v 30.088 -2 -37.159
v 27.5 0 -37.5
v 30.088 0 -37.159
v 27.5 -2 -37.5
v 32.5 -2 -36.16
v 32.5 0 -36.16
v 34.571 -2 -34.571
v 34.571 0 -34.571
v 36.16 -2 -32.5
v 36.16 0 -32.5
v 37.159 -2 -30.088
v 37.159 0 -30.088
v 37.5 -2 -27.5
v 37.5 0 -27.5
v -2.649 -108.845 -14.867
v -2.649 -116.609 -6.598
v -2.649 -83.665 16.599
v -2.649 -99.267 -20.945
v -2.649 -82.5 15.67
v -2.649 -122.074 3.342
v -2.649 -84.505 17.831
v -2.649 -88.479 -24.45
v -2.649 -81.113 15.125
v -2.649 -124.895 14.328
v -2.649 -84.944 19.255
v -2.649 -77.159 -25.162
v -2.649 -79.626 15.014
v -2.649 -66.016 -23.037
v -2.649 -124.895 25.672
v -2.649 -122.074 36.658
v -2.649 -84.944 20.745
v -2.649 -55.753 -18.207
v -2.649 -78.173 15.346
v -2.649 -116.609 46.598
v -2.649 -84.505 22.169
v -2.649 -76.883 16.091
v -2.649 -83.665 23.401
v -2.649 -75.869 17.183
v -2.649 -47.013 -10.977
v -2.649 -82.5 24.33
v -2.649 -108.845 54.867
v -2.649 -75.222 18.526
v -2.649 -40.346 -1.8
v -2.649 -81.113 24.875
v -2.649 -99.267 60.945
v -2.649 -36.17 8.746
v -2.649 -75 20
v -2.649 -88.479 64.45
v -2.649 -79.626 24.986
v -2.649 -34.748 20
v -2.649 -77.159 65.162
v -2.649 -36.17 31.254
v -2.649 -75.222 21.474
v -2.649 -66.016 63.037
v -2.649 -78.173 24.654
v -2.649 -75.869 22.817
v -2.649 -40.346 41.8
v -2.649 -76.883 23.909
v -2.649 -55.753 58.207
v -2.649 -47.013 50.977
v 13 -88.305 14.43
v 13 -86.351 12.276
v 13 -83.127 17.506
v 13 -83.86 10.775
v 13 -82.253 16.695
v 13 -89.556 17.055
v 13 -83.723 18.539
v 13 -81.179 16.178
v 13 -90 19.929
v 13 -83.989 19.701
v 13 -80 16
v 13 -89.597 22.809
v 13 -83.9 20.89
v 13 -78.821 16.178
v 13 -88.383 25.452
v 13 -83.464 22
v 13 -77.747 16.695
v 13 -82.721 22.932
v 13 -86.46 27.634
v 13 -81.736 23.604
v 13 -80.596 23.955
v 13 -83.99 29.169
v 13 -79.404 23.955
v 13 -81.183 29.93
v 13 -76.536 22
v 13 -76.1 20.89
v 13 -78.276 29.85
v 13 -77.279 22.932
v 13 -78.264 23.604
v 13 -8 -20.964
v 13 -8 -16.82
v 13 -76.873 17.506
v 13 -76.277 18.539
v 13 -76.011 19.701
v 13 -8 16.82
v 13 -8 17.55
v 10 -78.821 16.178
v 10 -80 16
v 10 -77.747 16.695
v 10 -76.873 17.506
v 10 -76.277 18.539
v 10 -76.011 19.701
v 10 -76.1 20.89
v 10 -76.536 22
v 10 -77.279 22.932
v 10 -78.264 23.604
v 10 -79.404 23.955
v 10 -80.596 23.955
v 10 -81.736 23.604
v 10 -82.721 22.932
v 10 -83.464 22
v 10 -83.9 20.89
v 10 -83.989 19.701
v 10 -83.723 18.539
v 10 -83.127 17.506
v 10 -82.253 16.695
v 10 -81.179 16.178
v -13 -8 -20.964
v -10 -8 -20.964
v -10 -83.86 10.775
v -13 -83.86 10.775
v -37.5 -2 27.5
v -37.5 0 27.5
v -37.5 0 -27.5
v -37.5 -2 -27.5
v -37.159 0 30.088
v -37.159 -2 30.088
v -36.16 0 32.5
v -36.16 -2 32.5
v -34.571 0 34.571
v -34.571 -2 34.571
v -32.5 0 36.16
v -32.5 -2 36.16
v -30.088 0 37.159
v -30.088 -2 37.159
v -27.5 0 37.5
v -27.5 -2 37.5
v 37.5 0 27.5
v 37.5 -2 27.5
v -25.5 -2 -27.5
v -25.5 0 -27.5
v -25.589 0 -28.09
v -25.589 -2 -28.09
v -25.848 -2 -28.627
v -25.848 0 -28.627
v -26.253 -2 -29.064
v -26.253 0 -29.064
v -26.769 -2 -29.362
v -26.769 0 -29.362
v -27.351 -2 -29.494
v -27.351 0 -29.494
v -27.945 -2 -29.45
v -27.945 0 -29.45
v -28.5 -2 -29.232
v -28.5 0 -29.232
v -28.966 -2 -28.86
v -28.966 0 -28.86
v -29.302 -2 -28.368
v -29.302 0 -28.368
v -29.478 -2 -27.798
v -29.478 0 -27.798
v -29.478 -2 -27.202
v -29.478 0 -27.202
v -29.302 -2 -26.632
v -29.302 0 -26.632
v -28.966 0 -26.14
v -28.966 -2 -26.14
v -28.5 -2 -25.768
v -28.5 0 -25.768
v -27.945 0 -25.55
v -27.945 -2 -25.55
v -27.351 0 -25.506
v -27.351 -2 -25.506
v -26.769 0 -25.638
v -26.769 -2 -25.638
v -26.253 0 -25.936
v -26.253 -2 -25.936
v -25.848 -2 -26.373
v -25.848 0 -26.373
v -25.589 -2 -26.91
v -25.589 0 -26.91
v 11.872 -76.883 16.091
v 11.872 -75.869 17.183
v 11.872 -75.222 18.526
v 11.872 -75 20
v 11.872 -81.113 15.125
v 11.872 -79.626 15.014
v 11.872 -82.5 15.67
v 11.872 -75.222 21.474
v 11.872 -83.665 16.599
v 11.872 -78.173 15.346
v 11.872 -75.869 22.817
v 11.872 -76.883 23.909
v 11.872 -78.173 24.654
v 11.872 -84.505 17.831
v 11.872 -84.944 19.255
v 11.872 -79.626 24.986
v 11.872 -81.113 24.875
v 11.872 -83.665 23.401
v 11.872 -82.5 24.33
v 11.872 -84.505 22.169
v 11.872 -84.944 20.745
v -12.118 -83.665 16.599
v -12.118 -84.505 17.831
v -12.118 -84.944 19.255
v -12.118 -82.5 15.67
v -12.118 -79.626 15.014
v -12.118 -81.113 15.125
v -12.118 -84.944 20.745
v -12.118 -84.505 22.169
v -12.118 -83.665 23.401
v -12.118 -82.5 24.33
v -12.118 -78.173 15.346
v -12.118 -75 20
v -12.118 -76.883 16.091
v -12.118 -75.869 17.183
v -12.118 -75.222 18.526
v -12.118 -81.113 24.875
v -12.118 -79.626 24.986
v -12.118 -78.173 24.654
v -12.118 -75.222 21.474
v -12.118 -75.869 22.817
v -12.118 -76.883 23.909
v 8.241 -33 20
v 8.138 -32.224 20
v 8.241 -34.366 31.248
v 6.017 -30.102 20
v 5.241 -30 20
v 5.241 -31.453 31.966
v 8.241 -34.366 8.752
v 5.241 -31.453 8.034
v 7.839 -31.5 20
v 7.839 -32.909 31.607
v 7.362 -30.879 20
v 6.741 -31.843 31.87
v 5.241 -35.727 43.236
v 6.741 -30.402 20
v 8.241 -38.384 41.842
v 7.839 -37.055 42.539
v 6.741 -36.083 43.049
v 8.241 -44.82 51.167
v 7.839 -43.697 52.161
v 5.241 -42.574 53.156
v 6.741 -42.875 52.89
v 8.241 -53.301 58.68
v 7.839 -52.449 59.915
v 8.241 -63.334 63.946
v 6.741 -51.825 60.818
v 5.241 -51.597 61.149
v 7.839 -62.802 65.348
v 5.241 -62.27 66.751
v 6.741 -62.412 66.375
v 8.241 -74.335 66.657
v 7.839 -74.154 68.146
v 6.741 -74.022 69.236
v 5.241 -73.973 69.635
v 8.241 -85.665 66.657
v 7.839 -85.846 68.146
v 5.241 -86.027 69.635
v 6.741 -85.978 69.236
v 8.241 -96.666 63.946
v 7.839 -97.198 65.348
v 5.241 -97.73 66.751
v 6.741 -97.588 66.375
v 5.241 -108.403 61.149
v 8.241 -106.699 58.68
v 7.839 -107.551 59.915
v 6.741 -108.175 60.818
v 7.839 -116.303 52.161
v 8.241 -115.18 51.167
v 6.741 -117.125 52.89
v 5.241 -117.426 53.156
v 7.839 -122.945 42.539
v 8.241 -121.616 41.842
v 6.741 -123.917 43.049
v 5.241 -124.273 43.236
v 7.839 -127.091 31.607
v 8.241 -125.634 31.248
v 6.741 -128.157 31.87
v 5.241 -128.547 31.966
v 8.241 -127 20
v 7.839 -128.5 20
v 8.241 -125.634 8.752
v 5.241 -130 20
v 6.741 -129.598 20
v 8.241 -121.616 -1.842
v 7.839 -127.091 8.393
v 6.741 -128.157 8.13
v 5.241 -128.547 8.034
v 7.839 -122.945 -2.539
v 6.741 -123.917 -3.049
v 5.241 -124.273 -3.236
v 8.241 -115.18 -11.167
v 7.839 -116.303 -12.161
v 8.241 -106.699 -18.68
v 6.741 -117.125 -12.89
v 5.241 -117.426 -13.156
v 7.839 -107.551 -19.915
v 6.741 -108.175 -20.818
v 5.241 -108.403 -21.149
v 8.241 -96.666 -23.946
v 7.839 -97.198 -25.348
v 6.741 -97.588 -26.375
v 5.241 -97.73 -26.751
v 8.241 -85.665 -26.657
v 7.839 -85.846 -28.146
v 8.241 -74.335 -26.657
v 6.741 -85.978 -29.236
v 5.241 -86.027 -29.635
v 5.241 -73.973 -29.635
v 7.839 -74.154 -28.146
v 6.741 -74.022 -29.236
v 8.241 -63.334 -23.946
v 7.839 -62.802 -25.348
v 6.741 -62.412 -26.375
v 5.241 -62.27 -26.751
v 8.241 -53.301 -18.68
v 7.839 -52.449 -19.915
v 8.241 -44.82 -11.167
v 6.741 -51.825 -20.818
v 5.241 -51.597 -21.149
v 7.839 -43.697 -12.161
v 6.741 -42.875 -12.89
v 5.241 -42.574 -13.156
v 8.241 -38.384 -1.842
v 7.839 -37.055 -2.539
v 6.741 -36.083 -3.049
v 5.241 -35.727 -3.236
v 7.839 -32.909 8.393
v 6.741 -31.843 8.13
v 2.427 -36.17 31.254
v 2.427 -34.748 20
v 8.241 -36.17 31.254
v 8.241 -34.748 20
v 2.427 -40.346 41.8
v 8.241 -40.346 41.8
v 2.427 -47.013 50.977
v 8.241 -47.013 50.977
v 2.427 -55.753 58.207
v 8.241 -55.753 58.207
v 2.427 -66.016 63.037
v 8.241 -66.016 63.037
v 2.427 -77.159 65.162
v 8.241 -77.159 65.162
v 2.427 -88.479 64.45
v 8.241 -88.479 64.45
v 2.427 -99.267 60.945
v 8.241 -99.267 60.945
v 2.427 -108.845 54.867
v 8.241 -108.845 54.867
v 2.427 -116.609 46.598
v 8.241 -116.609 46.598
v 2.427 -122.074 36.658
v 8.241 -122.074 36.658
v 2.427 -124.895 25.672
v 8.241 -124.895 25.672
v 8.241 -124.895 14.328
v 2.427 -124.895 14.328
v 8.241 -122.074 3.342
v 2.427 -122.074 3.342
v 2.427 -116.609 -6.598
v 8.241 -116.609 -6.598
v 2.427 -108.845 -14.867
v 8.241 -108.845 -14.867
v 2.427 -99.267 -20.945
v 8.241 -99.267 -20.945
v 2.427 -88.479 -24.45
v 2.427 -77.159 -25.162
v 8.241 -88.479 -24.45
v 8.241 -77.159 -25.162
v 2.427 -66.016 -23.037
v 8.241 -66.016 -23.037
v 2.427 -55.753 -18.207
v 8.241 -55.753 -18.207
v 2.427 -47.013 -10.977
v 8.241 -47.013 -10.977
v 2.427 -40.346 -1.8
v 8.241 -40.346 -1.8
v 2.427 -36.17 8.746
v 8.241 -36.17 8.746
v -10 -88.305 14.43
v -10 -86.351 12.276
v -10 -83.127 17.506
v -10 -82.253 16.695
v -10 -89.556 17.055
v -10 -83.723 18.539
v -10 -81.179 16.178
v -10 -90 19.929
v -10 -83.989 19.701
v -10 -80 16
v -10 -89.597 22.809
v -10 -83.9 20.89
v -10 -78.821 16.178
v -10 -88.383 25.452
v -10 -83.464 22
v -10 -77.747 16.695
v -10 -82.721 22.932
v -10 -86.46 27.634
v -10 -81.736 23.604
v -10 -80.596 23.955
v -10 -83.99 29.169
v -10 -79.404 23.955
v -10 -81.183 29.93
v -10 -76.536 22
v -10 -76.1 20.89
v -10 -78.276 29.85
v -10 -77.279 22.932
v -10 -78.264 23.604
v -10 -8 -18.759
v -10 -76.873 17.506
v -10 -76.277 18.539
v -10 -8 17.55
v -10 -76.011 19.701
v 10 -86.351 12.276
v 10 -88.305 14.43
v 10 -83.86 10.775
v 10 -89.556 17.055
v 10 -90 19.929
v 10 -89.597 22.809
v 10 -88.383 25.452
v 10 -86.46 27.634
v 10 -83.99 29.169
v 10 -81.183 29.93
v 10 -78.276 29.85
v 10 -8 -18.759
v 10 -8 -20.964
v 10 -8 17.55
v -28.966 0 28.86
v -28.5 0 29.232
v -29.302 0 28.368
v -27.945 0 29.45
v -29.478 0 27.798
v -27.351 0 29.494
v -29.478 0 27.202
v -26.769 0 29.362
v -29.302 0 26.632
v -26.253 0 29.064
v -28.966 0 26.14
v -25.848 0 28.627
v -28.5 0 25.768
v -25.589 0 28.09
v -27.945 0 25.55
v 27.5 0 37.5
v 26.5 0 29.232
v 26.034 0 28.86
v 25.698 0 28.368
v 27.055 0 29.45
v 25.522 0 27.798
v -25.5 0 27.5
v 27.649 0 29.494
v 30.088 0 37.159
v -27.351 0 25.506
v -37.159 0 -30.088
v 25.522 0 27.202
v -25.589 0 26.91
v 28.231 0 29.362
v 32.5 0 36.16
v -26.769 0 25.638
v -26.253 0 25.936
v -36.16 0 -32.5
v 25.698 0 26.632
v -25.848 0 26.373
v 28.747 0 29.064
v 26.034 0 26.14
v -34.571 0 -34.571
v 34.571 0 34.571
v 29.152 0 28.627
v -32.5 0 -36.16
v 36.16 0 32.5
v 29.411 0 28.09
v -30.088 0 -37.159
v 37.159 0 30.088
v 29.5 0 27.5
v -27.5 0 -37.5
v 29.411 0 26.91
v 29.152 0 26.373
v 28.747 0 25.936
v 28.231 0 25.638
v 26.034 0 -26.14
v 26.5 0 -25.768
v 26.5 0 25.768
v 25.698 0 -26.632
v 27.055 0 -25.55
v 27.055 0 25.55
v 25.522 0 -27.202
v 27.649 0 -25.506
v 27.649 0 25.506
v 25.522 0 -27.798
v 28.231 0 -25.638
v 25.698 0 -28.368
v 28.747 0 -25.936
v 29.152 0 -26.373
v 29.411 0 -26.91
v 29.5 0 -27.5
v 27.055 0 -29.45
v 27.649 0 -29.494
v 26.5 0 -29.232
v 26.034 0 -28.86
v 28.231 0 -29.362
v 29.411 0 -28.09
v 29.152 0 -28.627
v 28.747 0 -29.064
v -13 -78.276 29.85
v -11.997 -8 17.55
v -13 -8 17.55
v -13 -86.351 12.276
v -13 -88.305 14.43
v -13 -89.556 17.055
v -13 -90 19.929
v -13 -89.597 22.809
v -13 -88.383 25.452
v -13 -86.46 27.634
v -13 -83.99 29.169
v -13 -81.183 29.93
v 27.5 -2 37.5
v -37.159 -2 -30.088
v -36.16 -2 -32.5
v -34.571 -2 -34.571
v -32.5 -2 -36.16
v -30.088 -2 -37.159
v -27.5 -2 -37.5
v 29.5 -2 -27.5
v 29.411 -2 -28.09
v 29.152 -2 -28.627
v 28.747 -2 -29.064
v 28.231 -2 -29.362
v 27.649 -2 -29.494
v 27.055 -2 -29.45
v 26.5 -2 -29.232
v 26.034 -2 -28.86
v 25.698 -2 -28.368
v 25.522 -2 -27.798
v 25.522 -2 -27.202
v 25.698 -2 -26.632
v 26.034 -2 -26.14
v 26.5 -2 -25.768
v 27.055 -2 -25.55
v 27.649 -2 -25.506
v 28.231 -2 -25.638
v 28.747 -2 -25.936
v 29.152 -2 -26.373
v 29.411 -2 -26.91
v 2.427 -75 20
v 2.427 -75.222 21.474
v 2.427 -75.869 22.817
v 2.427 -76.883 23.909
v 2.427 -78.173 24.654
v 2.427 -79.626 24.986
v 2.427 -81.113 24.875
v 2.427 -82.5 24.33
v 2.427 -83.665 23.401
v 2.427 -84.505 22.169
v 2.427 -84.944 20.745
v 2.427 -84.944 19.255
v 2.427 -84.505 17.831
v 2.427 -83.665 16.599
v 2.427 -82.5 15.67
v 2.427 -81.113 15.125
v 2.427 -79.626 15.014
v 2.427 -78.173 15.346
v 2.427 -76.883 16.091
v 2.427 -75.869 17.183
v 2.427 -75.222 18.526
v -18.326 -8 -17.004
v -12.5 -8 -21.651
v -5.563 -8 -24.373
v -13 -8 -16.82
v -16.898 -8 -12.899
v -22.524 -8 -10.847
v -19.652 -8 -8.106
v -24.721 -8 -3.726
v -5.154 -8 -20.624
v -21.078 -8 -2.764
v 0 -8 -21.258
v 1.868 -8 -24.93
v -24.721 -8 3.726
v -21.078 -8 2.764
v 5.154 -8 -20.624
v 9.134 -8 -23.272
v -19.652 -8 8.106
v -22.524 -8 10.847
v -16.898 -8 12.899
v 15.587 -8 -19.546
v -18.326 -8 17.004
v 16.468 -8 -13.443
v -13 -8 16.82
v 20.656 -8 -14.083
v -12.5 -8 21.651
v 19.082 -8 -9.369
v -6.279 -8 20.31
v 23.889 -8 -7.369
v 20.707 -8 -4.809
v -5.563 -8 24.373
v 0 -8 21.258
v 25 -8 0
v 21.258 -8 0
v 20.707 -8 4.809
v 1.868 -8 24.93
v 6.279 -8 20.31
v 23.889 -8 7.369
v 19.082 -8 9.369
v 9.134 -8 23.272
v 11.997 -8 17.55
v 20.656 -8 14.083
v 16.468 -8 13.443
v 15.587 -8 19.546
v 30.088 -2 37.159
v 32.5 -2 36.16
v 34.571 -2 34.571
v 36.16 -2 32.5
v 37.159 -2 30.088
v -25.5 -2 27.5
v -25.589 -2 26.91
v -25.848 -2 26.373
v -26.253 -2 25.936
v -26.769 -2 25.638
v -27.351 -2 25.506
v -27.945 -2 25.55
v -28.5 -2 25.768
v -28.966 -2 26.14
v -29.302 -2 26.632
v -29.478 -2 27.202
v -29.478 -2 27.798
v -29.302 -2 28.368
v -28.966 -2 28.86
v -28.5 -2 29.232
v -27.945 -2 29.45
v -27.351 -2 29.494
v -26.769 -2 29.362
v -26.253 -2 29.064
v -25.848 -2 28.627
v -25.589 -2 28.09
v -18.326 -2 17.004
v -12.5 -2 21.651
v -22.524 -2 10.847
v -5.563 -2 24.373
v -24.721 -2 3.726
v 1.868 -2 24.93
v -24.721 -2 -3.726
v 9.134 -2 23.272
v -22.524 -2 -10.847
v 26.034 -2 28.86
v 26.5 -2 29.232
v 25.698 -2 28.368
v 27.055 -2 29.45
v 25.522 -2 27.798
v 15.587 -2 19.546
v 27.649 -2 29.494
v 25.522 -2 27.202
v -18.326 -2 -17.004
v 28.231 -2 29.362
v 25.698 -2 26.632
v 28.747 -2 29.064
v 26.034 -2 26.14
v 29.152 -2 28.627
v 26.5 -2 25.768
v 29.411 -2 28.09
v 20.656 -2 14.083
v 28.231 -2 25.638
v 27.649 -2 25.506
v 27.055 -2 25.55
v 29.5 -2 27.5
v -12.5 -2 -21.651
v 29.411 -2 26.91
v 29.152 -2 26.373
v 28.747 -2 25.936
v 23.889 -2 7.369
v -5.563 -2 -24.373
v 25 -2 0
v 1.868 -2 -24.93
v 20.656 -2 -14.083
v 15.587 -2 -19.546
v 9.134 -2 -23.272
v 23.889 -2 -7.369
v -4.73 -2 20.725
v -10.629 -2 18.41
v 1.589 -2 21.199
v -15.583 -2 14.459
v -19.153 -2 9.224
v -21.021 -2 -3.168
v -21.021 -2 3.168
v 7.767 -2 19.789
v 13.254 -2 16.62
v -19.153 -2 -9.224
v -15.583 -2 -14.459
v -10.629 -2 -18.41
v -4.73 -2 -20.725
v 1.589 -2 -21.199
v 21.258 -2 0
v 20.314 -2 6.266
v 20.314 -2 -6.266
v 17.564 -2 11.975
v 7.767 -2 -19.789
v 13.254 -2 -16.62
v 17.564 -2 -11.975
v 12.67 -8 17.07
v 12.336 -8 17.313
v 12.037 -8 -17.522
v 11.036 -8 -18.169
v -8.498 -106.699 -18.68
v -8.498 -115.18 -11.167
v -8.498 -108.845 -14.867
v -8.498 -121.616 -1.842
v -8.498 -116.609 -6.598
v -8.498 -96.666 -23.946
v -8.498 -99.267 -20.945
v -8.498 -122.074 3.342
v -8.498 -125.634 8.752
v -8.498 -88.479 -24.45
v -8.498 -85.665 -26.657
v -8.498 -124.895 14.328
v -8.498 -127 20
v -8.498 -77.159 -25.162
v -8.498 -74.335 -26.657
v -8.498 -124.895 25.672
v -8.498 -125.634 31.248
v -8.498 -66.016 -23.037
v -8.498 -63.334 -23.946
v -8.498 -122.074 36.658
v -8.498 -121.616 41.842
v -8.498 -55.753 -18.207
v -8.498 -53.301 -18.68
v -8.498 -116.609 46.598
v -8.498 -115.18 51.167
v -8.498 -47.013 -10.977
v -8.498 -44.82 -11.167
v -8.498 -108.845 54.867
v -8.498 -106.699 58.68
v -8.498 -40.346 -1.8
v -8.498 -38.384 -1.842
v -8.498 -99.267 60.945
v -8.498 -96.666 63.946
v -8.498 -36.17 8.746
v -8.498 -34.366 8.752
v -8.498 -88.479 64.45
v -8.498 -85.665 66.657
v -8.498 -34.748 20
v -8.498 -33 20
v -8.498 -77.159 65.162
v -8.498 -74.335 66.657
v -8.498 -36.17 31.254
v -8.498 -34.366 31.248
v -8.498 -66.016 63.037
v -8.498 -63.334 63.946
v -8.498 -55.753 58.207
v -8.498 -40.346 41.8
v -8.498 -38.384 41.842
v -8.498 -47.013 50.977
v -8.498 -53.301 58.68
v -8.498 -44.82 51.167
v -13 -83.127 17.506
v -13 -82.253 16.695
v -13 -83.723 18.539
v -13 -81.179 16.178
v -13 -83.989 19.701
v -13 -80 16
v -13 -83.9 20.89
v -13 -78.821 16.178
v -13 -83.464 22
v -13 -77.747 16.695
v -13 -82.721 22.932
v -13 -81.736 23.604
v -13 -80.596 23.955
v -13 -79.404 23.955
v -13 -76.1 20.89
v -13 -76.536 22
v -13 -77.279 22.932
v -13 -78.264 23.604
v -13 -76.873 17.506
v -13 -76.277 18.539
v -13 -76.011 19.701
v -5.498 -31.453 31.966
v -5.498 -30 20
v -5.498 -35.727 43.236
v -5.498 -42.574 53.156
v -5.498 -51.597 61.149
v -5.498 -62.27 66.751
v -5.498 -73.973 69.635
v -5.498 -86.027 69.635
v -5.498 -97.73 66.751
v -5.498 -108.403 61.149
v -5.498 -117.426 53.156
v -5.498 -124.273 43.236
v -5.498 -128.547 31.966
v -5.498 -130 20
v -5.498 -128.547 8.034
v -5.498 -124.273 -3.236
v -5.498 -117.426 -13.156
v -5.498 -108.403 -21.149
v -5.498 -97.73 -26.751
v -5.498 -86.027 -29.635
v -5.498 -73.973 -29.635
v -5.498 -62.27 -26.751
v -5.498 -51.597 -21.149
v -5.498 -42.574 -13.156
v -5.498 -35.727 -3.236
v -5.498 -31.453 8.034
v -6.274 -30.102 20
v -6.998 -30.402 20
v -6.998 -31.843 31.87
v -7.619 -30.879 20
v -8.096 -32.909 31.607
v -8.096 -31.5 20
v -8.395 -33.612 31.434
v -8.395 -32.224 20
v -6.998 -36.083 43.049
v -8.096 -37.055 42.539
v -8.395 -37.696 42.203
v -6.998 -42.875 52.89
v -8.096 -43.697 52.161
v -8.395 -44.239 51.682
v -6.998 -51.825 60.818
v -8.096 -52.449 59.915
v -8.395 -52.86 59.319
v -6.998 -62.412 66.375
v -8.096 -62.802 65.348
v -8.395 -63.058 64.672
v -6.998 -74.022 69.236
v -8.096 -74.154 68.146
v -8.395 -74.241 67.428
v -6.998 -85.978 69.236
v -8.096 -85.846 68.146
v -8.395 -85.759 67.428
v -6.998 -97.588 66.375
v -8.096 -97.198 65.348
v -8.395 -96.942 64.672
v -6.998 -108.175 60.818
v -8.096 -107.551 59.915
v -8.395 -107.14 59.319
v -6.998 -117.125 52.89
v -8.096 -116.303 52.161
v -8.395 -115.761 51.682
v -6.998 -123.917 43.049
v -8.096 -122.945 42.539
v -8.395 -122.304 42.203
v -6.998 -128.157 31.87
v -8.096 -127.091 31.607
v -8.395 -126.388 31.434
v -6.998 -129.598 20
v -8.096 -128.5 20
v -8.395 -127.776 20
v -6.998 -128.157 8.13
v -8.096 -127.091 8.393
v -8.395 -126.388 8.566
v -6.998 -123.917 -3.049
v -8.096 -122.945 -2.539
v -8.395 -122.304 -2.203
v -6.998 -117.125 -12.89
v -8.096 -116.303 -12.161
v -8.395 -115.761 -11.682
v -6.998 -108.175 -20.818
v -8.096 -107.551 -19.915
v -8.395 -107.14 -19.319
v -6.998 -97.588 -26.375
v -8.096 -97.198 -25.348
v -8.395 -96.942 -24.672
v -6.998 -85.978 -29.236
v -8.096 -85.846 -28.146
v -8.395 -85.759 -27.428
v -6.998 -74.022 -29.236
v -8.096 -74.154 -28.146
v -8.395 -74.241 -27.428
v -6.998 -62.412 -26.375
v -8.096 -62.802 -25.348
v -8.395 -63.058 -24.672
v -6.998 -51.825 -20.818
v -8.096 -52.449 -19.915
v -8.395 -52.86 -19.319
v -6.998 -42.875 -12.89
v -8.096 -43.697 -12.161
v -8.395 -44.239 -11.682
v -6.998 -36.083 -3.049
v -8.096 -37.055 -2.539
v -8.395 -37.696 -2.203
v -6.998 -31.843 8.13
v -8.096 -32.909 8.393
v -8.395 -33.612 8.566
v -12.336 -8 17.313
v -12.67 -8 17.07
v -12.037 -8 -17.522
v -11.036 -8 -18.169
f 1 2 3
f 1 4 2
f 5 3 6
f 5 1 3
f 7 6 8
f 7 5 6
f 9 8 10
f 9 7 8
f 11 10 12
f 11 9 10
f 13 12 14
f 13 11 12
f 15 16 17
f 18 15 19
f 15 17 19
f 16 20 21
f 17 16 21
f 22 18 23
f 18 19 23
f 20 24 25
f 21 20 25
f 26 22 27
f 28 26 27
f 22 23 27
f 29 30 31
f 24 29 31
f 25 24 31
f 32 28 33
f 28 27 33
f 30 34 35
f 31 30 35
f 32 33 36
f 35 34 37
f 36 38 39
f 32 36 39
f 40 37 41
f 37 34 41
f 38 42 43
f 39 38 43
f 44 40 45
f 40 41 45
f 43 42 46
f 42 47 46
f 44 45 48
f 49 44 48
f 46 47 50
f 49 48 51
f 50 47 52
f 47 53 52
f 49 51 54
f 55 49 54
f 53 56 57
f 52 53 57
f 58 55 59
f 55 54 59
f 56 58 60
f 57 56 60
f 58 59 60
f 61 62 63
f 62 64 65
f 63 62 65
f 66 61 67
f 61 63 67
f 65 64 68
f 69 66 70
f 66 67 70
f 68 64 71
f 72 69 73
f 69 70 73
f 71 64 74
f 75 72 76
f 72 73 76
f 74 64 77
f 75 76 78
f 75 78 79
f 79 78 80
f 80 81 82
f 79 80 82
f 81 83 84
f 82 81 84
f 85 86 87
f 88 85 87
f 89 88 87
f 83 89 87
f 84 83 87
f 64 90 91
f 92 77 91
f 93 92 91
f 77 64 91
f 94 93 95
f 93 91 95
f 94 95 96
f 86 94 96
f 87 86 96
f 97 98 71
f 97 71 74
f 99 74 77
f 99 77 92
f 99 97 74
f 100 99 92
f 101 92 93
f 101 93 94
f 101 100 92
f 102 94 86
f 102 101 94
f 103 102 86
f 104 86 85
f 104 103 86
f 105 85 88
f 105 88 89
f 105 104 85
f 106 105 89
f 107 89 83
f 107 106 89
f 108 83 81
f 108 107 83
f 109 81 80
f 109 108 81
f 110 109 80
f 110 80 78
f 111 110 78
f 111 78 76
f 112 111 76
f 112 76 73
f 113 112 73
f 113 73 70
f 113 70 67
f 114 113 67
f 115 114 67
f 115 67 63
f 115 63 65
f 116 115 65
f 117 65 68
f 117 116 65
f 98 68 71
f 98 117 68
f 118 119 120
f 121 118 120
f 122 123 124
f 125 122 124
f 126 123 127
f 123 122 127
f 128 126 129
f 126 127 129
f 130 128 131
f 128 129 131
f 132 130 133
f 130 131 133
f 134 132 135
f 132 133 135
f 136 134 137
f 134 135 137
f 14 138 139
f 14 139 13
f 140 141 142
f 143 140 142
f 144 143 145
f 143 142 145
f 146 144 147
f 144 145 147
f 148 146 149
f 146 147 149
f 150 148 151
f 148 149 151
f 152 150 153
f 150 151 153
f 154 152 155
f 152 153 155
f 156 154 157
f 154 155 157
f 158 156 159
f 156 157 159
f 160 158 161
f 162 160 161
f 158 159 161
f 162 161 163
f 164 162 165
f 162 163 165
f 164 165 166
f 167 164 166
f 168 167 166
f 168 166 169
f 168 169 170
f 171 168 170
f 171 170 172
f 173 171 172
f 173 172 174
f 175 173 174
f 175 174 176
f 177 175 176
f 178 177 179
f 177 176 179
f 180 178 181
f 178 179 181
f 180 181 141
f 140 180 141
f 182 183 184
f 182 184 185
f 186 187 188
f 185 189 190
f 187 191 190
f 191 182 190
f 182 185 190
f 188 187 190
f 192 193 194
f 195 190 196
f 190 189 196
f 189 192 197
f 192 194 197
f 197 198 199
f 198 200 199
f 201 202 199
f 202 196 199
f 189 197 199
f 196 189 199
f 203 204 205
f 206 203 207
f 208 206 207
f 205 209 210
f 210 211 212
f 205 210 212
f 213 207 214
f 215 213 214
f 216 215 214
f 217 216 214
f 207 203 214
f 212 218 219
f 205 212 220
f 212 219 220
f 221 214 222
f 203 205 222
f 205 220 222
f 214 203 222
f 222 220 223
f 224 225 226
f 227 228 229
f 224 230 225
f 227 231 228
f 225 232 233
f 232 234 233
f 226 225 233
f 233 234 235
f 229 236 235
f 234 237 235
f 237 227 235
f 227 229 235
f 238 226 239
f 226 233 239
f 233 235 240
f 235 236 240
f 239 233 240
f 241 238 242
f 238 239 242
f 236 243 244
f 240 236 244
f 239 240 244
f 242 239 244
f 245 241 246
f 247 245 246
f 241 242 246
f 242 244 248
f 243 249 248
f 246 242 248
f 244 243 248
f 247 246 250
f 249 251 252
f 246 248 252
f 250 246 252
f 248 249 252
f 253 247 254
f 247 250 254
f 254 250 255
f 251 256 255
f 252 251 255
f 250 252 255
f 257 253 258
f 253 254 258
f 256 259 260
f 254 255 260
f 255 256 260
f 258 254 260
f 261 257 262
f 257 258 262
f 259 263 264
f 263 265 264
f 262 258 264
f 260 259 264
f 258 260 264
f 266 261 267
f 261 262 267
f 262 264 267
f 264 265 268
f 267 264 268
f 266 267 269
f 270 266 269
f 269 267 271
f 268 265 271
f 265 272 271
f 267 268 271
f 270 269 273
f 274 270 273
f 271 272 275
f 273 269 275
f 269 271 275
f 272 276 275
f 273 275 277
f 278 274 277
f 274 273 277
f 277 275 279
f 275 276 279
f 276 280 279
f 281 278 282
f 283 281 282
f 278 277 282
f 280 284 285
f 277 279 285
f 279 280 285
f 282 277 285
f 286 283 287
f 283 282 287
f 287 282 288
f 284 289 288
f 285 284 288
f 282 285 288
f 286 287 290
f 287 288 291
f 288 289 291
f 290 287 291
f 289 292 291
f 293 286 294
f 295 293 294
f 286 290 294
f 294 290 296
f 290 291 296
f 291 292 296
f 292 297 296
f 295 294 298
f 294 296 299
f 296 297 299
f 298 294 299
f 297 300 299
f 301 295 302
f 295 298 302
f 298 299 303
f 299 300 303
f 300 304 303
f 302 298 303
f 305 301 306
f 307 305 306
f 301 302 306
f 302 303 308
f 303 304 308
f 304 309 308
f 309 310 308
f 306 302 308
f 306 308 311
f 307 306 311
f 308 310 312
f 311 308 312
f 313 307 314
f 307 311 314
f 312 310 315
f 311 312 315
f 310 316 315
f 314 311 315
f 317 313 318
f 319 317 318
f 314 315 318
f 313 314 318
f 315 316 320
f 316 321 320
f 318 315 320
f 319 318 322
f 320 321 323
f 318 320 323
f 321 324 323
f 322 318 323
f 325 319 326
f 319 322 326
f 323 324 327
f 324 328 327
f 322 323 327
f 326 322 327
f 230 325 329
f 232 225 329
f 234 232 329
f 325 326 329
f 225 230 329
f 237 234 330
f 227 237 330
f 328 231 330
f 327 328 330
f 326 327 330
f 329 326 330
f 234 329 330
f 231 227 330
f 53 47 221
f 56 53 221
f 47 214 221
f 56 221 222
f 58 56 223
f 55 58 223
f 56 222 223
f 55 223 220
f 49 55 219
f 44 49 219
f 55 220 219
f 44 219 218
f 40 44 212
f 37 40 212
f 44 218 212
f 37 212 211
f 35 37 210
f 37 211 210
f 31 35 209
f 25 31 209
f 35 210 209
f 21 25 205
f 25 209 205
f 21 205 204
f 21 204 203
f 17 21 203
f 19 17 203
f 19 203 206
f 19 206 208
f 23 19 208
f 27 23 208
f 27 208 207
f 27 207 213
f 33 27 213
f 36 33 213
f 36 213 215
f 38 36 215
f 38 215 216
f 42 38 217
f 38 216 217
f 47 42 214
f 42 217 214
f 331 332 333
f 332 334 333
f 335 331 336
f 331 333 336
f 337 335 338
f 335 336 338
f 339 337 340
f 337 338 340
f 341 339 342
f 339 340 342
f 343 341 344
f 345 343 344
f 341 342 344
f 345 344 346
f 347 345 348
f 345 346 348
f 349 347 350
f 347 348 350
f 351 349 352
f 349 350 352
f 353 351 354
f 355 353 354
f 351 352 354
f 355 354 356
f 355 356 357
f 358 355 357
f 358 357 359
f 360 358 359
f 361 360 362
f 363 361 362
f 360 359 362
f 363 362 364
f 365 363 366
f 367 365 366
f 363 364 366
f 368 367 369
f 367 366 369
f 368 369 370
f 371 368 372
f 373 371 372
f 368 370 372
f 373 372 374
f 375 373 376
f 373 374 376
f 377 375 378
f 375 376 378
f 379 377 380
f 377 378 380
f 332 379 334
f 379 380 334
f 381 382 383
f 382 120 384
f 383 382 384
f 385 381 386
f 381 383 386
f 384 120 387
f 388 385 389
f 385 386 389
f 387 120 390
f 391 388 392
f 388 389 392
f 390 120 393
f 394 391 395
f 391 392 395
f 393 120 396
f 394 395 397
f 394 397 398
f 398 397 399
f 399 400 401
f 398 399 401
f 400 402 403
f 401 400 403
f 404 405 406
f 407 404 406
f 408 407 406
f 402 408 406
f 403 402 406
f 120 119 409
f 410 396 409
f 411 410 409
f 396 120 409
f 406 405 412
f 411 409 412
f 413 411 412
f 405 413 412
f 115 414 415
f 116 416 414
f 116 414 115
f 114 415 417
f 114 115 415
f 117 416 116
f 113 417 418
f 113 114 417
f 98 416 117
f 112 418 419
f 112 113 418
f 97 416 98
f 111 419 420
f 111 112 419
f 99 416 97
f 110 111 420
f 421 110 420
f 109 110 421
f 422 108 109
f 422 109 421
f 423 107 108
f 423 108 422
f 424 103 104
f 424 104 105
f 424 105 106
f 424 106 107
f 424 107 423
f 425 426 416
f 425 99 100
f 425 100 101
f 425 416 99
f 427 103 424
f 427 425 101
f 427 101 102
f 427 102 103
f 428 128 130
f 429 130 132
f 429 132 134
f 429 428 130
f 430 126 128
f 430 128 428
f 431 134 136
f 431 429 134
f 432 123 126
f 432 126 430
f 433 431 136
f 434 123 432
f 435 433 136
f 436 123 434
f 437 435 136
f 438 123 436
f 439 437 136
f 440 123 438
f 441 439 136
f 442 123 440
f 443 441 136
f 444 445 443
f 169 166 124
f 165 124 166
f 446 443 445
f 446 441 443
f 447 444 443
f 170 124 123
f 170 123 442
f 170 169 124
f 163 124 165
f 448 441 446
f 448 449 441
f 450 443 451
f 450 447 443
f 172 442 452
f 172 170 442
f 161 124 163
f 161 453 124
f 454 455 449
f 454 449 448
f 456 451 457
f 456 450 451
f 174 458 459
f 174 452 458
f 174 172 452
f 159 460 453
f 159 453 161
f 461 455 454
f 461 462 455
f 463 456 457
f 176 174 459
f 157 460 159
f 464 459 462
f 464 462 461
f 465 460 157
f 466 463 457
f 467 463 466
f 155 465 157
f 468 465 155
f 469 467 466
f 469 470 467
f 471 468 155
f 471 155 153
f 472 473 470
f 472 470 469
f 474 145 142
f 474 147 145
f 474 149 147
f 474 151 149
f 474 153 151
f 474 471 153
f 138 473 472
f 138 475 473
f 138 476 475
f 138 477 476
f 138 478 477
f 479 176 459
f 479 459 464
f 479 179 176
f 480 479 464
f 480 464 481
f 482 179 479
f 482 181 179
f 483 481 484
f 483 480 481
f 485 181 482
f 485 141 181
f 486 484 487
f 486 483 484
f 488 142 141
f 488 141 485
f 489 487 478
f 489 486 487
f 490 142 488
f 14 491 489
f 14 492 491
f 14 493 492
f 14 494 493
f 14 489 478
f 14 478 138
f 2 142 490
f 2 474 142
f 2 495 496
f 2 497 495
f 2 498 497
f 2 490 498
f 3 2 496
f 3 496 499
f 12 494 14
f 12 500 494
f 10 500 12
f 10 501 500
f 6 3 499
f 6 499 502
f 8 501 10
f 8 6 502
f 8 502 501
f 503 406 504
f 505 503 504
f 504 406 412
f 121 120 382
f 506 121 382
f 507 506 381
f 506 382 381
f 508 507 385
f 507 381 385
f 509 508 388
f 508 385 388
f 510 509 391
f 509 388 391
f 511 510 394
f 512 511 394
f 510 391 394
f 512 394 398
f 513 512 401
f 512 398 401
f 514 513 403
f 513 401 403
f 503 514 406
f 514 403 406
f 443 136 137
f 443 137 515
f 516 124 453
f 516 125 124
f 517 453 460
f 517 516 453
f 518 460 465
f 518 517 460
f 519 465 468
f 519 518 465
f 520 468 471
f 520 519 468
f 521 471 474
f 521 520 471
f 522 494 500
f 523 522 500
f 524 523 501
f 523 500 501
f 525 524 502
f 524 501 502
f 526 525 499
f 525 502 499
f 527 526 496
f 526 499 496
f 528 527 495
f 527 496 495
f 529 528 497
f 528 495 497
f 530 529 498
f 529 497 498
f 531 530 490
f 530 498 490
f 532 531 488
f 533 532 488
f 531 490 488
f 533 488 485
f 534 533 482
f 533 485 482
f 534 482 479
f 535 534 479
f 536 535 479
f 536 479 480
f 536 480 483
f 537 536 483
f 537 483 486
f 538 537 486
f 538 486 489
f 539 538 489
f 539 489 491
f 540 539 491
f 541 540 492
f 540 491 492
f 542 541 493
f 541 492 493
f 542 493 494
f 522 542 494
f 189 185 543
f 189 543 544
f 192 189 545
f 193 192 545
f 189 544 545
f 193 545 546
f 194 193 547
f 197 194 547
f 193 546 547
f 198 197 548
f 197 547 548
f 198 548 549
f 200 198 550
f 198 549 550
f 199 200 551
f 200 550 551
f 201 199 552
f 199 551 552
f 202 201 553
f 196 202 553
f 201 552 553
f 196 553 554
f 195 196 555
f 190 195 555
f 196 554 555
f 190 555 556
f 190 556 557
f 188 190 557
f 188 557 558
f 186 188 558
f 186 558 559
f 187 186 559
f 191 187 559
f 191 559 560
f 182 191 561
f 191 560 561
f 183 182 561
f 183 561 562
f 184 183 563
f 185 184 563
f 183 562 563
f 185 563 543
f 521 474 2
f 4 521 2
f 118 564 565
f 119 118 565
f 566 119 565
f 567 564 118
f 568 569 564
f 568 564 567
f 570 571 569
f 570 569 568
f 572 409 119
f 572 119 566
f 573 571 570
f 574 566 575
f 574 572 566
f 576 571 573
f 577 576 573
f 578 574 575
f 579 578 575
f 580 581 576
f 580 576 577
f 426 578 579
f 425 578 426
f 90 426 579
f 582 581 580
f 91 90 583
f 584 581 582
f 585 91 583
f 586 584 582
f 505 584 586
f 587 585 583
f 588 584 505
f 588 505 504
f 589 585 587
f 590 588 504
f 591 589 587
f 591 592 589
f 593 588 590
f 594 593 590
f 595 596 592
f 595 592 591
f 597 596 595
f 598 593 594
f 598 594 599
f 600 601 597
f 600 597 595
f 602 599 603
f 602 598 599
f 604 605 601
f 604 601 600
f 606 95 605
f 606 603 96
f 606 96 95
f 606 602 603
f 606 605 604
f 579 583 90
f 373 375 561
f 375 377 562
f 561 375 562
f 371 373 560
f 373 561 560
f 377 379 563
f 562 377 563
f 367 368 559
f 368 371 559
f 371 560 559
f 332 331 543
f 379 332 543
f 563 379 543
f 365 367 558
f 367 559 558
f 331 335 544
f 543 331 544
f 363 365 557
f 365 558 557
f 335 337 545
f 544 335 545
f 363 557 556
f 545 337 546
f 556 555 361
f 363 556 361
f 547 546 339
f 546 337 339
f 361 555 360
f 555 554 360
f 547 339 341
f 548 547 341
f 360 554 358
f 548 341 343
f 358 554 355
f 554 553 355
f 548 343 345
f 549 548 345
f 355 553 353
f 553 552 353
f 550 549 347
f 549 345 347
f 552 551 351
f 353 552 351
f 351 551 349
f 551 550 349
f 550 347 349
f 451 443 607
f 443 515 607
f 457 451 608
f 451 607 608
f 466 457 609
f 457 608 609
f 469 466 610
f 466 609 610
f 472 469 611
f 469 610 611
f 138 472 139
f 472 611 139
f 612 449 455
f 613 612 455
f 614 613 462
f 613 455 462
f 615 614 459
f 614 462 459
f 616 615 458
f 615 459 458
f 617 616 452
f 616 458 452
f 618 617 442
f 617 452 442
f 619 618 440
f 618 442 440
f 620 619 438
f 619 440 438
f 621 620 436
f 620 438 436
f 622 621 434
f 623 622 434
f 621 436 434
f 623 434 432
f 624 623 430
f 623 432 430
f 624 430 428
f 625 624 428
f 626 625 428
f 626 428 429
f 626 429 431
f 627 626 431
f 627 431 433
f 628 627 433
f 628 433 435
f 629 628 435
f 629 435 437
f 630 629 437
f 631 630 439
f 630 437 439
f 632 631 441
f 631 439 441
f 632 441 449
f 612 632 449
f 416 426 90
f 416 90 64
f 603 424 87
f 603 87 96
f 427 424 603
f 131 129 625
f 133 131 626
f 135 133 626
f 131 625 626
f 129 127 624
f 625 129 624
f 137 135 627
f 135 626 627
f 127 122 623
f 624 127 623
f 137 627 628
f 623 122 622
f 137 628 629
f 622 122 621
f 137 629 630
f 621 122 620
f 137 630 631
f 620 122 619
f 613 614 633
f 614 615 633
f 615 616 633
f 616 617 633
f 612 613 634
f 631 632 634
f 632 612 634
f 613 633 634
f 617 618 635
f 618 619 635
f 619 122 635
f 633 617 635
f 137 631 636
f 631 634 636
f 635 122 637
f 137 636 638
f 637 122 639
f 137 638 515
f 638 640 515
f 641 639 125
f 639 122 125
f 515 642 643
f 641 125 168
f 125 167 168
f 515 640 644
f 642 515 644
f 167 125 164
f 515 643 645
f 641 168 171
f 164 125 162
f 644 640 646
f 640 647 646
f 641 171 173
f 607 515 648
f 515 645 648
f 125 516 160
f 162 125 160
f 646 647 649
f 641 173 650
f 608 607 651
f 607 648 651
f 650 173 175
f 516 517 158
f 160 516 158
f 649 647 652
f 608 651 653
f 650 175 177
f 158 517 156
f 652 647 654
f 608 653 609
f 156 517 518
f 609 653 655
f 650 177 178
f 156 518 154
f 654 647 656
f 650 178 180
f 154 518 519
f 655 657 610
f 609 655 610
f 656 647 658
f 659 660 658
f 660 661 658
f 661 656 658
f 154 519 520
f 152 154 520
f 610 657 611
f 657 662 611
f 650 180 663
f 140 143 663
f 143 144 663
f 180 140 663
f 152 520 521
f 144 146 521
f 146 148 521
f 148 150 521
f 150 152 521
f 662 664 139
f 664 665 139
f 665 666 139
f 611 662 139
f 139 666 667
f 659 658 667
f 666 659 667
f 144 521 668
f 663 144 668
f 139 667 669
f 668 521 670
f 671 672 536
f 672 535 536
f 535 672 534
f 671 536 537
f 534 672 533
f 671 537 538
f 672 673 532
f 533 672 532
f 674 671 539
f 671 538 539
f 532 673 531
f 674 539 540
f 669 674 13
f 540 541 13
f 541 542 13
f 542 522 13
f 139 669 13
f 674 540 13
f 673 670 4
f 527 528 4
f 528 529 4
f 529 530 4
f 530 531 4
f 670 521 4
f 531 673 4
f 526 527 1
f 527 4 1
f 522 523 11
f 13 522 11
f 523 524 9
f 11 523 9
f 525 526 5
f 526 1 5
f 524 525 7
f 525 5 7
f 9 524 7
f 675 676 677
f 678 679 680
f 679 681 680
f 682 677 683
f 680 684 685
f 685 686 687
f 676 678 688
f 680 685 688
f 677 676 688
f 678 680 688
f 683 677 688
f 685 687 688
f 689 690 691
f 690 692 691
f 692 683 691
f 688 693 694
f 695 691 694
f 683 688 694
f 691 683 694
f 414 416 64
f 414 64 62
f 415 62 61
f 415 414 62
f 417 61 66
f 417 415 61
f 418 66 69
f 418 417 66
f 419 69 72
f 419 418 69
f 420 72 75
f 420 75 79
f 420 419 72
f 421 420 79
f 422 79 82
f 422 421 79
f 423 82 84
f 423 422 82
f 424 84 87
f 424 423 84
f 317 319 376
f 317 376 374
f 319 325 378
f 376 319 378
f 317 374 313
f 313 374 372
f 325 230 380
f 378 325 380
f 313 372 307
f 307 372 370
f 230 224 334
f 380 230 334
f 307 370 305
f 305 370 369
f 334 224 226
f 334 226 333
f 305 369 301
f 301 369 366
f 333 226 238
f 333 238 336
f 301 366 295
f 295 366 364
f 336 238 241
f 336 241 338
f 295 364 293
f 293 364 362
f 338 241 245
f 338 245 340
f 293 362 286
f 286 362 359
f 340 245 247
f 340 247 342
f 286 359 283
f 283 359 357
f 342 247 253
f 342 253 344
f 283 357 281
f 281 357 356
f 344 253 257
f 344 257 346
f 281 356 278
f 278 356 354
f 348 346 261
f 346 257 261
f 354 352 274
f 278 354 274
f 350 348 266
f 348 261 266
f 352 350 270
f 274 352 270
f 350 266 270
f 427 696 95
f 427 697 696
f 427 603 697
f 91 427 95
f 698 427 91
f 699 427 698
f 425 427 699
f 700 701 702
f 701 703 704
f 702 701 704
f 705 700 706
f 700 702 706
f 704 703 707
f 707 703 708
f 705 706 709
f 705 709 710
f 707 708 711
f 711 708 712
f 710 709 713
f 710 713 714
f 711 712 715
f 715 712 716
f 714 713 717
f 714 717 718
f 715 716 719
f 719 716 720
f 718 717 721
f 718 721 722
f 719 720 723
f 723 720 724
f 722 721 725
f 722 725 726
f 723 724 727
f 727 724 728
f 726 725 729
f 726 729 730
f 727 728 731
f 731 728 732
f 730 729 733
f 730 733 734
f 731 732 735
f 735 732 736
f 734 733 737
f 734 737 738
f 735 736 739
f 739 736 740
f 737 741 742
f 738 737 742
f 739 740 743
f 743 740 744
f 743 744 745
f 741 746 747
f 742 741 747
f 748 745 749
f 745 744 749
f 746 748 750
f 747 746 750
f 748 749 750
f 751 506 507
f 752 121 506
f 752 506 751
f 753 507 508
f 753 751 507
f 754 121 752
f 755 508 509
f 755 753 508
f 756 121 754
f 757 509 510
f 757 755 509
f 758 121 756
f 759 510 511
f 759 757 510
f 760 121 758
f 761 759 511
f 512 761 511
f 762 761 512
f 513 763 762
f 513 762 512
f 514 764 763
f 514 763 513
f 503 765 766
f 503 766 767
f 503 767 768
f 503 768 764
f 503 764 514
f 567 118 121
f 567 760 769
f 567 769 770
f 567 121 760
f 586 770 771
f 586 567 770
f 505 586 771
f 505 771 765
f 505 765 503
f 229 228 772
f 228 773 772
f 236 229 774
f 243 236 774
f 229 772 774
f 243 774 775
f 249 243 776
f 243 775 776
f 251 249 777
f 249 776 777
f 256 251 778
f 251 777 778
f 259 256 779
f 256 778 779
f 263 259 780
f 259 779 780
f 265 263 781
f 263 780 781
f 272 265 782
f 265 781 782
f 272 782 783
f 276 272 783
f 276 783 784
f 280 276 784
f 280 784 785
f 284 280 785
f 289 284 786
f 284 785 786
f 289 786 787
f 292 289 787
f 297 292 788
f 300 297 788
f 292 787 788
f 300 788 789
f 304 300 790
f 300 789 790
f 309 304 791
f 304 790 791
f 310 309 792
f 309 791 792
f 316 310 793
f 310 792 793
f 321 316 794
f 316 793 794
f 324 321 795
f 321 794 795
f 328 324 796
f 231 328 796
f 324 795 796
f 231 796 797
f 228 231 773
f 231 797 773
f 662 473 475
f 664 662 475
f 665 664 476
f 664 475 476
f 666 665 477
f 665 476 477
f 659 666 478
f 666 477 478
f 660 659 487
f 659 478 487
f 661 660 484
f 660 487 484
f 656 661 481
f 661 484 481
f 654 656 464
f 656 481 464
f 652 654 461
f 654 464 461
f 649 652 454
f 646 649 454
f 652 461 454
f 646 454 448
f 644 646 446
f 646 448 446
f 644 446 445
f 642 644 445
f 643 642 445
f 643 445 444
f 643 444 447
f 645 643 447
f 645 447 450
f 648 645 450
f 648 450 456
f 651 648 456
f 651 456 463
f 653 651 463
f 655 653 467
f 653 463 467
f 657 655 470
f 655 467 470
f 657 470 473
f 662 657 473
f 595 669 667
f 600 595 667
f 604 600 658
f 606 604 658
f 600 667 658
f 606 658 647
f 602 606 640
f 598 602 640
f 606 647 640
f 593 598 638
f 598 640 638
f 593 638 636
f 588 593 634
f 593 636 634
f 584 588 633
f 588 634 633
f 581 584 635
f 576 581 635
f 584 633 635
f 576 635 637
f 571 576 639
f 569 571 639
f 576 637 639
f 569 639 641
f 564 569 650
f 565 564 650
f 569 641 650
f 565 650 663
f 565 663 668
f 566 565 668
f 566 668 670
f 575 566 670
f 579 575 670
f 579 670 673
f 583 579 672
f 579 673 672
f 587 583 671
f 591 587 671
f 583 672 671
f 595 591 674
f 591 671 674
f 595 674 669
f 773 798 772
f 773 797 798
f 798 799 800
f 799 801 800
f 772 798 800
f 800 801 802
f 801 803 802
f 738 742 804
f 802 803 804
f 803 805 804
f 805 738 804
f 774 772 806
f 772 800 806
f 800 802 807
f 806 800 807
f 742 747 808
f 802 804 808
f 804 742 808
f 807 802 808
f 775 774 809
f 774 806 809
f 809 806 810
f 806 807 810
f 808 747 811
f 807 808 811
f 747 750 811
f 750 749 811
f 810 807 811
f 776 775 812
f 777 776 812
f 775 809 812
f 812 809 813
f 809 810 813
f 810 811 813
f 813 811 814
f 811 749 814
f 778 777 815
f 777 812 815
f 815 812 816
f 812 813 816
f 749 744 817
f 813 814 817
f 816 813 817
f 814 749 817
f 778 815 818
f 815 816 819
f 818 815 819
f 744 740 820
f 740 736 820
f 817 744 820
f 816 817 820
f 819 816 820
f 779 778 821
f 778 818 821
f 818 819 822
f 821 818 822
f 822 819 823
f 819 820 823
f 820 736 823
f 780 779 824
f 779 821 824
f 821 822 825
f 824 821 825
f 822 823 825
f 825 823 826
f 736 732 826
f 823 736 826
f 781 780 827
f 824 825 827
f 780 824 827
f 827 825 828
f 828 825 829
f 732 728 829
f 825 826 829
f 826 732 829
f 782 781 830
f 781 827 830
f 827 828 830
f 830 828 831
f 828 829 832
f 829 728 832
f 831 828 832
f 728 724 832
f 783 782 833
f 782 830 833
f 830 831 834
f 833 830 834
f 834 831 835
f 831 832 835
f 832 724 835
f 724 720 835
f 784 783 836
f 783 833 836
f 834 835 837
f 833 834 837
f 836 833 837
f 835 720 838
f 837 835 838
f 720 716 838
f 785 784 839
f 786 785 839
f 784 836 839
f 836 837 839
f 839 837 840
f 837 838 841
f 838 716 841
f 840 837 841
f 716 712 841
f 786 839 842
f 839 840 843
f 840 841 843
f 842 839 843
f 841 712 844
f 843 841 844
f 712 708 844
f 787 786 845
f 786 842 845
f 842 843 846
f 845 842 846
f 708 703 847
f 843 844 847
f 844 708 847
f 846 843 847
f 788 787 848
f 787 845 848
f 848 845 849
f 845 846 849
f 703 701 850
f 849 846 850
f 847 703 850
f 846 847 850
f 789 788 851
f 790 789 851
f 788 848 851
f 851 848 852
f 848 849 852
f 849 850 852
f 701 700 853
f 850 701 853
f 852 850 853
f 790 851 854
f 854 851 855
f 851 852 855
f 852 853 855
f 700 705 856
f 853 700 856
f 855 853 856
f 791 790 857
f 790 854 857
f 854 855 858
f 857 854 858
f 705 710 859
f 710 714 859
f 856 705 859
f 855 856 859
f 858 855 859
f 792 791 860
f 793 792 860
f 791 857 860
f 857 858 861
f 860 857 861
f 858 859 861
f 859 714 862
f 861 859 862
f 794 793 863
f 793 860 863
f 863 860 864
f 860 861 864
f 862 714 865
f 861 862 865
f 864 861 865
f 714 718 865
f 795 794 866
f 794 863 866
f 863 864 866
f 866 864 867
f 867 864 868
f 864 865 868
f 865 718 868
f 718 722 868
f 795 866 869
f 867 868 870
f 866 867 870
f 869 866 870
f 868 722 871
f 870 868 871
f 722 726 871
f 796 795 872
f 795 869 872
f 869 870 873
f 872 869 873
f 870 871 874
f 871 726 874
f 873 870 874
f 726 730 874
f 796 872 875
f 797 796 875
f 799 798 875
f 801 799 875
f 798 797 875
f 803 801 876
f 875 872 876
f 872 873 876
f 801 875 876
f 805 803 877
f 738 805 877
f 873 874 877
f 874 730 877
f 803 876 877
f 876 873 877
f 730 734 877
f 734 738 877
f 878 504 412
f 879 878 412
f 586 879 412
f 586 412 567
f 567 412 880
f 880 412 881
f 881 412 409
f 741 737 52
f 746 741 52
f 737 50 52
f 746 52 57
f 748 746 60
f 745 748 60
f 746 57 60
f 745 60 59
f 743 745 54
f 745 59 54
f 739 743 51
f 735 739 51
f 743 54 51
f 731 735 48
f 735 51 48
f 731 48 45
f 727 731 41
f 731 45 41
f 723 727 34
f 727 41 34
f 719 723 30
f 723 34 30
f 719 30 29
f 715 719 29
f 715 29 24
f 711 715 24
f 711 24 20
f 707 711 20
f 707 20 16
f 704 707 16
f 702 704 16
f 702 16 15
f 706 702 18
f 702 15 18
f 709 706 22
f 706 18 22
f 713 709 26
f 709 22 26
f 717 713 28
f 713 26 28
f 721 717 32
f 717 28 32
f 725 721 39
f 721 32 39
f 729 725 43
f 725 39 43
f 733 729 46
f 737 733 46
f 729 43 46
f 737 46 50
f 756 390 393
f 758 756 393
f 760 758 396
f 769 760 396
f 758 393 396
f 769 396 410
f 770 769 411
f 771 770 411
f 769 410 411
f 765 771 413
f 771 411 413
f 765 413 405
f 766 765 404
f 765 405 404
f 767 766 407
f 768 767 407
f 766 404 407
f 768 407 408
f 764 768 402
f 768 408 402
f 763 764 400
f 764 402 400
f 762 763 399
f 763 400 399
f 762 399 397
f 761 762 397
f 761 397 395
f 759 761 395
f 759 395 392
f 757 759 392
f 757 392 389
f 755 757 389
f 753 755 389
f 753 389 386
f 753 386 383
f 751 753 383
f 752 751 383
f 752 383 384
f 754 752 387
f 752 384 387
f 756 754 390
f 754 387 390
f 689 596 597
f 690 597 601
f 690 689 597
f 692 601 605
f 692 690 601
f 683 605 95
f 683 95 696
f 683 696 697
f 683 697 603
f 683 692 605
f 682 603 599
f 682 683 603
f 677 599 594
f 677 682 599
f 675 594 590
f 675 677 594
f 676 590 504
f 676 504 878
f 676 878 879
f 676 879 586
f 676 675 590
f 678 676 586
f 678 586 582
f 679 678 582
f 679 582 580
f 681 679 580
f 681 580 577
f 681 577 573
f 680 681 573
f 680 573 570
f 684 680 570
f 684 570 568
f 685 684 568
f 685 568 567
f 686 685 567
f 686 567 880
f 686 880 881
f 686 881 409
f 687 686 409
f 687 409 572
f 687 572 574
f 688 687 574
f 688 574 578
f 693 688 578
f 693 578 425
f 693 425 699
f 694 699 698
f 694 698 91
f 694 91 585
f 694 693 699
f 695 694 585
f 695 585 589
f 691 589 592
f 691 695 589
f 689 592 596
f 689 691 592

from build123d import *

# Parameters (mm, degrees)
SKETCH1_W           = 75
SKETCH1_H           = 75
SKETCH1_R           = 2
BOSS_EXTRUDE1_DEPTH = 2
FILLET1_R           = 10
SKETCH2_R           = 25
SKETCH2_R_2         = 21.258264894
BOSS_EXTRUDE2_DEPTH = 6
BOSS_EXTRUDE3_START = 10
SKETCH3_R           = 4
BOSS_EXTRUDE3_DEPTH = 3


with BuildPart() as part:
    # Sketch1 → Boss-Extrude1 (new body)
    with BuildSketch(Plane(origin=(0, 0, 0), x_dir=(1, 0, 0), z_dir=(0, 1, 0))):
        Rectangle(SKETCH1_W, SKETCH1_H)
        with Locations((27.5, 27.5)):
            Circle(SKETCH1_R, mode=Mode.SUBTRACT)
        with Locations((27.5, -27.5)):
            Circle(SKETCH1_R, mode=Mode.SUBTRACT)
        with Locations((-27.5, -27.5)):
            Circle(SKETCH1_R, mode=Mode.SUBTRACT)
        with Locations((-27.5, 27.5)):
            Circle(SKETCH1_R, mode=Mode.SUBTRACT)
    extrude(amount=-BOSS_EXTRUDE1_DEPTH)

    # Fillet1
    fillet1_edges = [part.edges().sort_by_distance(p)[0] for p in [
        (-37.5, -1, -37.5),
        (37.5, -1, -37.5),
        (37.5, -1, 37.5),
        (-37.5, -1, 37.5),
    ]]
    fillet(fillet1_edges, radius=FILLET1_R)

    # Sketch2 → Boss-Extrude2 (add)
    with BuildSketch(Plane.XZ.offset(2)):
        Circle(SKETCH2_R)
        Circle(SKETCH2_R_2, mode=Mode.SUBTRACT)
    extrude(amount=BOSS_EXTRUDE2_DEPTH)

    # Sketch3 → Boss-Extrude3 (add)
    with BuildSketch(Plane(origin=(0, 0, 0), x_dir=(0, 0, -1), z_dir=(1, 0, 0)).offset(BOSS_EXTRUDE3_START)):
        with BuildLine():
            Line((-17.549509853, -8), (20.96355147, -8))
            Line((20.96355147, -8), (-10.774863226, -83.859643959))
            ThreePointArc((-10.774863226, -83.859643959), (-22.809331855, -89.597273286), (-29.850246108, -78.275862069))
            Line((-29.850246108, -78.275862069), (-17.549509853, -8))
        make_face()
        with Locations((-20, -80)):
            Circle(SKETCH3_R, mode=Mode.SUBTRACT)
    boss_extrude3 = extrude(amount=BOSS_EXTRUDE3_DEPTH)

    # Mirror1: Boss-Extrude3 across plane
    add(boss_extrude3.mirror(Plane(origin=(0, 0, 0), x_dir=(0, 0, 1), z_dir=(1, 0, 0))))


with BuildPart() as body_2:
    # Sketch4 → Revolve1 (revolve)
    with BuildSketch(Plane.XY.offset(20)):
        with BuildLine():
            Line((2.427228953, -34.748253365), (8.240625297, -34.748253365))
            Line((8.240625297, -34.748253365), (8.240625297, -33))
            ThreePointArc((8.240625297, -33), (7.361945641, -30.878679656), (5.240625297, -30))
            Line((5.240625297, -30), (-5.497712052, -30))
            ThreePointArc((-5.497712052, -30), (-7.619032396, -30.878679656), (-8.497712052, -33))
            Line((-8.497712052, -33), (-8.497712052, -34.748253365))
            Line((-8.497712052, -34.748253365), (-2.649289123, -34.748253365))
            Line((-2.649289123, -34.748253365), (-2.649289123, -75))
            Line((-2.649289123, -75), (-12.118055879, -75))
            Line((-12.118055879, -75), (-12.118055879, -80))
            Line((-12.118055879, -80), (11.871921874, -80))
            Line((11.871921874, -80), (11.871921874, -75))
            Line((11.871921874, -75), (2.427228953, -75))
            Line((2.427228953, -75), (2.427228953, -34.748253365))
        make_face()
    revolve(axis=Axis((-10, -80, 20), (1, 0, 0)))


solid = Compound([part.part, body_2.part])
